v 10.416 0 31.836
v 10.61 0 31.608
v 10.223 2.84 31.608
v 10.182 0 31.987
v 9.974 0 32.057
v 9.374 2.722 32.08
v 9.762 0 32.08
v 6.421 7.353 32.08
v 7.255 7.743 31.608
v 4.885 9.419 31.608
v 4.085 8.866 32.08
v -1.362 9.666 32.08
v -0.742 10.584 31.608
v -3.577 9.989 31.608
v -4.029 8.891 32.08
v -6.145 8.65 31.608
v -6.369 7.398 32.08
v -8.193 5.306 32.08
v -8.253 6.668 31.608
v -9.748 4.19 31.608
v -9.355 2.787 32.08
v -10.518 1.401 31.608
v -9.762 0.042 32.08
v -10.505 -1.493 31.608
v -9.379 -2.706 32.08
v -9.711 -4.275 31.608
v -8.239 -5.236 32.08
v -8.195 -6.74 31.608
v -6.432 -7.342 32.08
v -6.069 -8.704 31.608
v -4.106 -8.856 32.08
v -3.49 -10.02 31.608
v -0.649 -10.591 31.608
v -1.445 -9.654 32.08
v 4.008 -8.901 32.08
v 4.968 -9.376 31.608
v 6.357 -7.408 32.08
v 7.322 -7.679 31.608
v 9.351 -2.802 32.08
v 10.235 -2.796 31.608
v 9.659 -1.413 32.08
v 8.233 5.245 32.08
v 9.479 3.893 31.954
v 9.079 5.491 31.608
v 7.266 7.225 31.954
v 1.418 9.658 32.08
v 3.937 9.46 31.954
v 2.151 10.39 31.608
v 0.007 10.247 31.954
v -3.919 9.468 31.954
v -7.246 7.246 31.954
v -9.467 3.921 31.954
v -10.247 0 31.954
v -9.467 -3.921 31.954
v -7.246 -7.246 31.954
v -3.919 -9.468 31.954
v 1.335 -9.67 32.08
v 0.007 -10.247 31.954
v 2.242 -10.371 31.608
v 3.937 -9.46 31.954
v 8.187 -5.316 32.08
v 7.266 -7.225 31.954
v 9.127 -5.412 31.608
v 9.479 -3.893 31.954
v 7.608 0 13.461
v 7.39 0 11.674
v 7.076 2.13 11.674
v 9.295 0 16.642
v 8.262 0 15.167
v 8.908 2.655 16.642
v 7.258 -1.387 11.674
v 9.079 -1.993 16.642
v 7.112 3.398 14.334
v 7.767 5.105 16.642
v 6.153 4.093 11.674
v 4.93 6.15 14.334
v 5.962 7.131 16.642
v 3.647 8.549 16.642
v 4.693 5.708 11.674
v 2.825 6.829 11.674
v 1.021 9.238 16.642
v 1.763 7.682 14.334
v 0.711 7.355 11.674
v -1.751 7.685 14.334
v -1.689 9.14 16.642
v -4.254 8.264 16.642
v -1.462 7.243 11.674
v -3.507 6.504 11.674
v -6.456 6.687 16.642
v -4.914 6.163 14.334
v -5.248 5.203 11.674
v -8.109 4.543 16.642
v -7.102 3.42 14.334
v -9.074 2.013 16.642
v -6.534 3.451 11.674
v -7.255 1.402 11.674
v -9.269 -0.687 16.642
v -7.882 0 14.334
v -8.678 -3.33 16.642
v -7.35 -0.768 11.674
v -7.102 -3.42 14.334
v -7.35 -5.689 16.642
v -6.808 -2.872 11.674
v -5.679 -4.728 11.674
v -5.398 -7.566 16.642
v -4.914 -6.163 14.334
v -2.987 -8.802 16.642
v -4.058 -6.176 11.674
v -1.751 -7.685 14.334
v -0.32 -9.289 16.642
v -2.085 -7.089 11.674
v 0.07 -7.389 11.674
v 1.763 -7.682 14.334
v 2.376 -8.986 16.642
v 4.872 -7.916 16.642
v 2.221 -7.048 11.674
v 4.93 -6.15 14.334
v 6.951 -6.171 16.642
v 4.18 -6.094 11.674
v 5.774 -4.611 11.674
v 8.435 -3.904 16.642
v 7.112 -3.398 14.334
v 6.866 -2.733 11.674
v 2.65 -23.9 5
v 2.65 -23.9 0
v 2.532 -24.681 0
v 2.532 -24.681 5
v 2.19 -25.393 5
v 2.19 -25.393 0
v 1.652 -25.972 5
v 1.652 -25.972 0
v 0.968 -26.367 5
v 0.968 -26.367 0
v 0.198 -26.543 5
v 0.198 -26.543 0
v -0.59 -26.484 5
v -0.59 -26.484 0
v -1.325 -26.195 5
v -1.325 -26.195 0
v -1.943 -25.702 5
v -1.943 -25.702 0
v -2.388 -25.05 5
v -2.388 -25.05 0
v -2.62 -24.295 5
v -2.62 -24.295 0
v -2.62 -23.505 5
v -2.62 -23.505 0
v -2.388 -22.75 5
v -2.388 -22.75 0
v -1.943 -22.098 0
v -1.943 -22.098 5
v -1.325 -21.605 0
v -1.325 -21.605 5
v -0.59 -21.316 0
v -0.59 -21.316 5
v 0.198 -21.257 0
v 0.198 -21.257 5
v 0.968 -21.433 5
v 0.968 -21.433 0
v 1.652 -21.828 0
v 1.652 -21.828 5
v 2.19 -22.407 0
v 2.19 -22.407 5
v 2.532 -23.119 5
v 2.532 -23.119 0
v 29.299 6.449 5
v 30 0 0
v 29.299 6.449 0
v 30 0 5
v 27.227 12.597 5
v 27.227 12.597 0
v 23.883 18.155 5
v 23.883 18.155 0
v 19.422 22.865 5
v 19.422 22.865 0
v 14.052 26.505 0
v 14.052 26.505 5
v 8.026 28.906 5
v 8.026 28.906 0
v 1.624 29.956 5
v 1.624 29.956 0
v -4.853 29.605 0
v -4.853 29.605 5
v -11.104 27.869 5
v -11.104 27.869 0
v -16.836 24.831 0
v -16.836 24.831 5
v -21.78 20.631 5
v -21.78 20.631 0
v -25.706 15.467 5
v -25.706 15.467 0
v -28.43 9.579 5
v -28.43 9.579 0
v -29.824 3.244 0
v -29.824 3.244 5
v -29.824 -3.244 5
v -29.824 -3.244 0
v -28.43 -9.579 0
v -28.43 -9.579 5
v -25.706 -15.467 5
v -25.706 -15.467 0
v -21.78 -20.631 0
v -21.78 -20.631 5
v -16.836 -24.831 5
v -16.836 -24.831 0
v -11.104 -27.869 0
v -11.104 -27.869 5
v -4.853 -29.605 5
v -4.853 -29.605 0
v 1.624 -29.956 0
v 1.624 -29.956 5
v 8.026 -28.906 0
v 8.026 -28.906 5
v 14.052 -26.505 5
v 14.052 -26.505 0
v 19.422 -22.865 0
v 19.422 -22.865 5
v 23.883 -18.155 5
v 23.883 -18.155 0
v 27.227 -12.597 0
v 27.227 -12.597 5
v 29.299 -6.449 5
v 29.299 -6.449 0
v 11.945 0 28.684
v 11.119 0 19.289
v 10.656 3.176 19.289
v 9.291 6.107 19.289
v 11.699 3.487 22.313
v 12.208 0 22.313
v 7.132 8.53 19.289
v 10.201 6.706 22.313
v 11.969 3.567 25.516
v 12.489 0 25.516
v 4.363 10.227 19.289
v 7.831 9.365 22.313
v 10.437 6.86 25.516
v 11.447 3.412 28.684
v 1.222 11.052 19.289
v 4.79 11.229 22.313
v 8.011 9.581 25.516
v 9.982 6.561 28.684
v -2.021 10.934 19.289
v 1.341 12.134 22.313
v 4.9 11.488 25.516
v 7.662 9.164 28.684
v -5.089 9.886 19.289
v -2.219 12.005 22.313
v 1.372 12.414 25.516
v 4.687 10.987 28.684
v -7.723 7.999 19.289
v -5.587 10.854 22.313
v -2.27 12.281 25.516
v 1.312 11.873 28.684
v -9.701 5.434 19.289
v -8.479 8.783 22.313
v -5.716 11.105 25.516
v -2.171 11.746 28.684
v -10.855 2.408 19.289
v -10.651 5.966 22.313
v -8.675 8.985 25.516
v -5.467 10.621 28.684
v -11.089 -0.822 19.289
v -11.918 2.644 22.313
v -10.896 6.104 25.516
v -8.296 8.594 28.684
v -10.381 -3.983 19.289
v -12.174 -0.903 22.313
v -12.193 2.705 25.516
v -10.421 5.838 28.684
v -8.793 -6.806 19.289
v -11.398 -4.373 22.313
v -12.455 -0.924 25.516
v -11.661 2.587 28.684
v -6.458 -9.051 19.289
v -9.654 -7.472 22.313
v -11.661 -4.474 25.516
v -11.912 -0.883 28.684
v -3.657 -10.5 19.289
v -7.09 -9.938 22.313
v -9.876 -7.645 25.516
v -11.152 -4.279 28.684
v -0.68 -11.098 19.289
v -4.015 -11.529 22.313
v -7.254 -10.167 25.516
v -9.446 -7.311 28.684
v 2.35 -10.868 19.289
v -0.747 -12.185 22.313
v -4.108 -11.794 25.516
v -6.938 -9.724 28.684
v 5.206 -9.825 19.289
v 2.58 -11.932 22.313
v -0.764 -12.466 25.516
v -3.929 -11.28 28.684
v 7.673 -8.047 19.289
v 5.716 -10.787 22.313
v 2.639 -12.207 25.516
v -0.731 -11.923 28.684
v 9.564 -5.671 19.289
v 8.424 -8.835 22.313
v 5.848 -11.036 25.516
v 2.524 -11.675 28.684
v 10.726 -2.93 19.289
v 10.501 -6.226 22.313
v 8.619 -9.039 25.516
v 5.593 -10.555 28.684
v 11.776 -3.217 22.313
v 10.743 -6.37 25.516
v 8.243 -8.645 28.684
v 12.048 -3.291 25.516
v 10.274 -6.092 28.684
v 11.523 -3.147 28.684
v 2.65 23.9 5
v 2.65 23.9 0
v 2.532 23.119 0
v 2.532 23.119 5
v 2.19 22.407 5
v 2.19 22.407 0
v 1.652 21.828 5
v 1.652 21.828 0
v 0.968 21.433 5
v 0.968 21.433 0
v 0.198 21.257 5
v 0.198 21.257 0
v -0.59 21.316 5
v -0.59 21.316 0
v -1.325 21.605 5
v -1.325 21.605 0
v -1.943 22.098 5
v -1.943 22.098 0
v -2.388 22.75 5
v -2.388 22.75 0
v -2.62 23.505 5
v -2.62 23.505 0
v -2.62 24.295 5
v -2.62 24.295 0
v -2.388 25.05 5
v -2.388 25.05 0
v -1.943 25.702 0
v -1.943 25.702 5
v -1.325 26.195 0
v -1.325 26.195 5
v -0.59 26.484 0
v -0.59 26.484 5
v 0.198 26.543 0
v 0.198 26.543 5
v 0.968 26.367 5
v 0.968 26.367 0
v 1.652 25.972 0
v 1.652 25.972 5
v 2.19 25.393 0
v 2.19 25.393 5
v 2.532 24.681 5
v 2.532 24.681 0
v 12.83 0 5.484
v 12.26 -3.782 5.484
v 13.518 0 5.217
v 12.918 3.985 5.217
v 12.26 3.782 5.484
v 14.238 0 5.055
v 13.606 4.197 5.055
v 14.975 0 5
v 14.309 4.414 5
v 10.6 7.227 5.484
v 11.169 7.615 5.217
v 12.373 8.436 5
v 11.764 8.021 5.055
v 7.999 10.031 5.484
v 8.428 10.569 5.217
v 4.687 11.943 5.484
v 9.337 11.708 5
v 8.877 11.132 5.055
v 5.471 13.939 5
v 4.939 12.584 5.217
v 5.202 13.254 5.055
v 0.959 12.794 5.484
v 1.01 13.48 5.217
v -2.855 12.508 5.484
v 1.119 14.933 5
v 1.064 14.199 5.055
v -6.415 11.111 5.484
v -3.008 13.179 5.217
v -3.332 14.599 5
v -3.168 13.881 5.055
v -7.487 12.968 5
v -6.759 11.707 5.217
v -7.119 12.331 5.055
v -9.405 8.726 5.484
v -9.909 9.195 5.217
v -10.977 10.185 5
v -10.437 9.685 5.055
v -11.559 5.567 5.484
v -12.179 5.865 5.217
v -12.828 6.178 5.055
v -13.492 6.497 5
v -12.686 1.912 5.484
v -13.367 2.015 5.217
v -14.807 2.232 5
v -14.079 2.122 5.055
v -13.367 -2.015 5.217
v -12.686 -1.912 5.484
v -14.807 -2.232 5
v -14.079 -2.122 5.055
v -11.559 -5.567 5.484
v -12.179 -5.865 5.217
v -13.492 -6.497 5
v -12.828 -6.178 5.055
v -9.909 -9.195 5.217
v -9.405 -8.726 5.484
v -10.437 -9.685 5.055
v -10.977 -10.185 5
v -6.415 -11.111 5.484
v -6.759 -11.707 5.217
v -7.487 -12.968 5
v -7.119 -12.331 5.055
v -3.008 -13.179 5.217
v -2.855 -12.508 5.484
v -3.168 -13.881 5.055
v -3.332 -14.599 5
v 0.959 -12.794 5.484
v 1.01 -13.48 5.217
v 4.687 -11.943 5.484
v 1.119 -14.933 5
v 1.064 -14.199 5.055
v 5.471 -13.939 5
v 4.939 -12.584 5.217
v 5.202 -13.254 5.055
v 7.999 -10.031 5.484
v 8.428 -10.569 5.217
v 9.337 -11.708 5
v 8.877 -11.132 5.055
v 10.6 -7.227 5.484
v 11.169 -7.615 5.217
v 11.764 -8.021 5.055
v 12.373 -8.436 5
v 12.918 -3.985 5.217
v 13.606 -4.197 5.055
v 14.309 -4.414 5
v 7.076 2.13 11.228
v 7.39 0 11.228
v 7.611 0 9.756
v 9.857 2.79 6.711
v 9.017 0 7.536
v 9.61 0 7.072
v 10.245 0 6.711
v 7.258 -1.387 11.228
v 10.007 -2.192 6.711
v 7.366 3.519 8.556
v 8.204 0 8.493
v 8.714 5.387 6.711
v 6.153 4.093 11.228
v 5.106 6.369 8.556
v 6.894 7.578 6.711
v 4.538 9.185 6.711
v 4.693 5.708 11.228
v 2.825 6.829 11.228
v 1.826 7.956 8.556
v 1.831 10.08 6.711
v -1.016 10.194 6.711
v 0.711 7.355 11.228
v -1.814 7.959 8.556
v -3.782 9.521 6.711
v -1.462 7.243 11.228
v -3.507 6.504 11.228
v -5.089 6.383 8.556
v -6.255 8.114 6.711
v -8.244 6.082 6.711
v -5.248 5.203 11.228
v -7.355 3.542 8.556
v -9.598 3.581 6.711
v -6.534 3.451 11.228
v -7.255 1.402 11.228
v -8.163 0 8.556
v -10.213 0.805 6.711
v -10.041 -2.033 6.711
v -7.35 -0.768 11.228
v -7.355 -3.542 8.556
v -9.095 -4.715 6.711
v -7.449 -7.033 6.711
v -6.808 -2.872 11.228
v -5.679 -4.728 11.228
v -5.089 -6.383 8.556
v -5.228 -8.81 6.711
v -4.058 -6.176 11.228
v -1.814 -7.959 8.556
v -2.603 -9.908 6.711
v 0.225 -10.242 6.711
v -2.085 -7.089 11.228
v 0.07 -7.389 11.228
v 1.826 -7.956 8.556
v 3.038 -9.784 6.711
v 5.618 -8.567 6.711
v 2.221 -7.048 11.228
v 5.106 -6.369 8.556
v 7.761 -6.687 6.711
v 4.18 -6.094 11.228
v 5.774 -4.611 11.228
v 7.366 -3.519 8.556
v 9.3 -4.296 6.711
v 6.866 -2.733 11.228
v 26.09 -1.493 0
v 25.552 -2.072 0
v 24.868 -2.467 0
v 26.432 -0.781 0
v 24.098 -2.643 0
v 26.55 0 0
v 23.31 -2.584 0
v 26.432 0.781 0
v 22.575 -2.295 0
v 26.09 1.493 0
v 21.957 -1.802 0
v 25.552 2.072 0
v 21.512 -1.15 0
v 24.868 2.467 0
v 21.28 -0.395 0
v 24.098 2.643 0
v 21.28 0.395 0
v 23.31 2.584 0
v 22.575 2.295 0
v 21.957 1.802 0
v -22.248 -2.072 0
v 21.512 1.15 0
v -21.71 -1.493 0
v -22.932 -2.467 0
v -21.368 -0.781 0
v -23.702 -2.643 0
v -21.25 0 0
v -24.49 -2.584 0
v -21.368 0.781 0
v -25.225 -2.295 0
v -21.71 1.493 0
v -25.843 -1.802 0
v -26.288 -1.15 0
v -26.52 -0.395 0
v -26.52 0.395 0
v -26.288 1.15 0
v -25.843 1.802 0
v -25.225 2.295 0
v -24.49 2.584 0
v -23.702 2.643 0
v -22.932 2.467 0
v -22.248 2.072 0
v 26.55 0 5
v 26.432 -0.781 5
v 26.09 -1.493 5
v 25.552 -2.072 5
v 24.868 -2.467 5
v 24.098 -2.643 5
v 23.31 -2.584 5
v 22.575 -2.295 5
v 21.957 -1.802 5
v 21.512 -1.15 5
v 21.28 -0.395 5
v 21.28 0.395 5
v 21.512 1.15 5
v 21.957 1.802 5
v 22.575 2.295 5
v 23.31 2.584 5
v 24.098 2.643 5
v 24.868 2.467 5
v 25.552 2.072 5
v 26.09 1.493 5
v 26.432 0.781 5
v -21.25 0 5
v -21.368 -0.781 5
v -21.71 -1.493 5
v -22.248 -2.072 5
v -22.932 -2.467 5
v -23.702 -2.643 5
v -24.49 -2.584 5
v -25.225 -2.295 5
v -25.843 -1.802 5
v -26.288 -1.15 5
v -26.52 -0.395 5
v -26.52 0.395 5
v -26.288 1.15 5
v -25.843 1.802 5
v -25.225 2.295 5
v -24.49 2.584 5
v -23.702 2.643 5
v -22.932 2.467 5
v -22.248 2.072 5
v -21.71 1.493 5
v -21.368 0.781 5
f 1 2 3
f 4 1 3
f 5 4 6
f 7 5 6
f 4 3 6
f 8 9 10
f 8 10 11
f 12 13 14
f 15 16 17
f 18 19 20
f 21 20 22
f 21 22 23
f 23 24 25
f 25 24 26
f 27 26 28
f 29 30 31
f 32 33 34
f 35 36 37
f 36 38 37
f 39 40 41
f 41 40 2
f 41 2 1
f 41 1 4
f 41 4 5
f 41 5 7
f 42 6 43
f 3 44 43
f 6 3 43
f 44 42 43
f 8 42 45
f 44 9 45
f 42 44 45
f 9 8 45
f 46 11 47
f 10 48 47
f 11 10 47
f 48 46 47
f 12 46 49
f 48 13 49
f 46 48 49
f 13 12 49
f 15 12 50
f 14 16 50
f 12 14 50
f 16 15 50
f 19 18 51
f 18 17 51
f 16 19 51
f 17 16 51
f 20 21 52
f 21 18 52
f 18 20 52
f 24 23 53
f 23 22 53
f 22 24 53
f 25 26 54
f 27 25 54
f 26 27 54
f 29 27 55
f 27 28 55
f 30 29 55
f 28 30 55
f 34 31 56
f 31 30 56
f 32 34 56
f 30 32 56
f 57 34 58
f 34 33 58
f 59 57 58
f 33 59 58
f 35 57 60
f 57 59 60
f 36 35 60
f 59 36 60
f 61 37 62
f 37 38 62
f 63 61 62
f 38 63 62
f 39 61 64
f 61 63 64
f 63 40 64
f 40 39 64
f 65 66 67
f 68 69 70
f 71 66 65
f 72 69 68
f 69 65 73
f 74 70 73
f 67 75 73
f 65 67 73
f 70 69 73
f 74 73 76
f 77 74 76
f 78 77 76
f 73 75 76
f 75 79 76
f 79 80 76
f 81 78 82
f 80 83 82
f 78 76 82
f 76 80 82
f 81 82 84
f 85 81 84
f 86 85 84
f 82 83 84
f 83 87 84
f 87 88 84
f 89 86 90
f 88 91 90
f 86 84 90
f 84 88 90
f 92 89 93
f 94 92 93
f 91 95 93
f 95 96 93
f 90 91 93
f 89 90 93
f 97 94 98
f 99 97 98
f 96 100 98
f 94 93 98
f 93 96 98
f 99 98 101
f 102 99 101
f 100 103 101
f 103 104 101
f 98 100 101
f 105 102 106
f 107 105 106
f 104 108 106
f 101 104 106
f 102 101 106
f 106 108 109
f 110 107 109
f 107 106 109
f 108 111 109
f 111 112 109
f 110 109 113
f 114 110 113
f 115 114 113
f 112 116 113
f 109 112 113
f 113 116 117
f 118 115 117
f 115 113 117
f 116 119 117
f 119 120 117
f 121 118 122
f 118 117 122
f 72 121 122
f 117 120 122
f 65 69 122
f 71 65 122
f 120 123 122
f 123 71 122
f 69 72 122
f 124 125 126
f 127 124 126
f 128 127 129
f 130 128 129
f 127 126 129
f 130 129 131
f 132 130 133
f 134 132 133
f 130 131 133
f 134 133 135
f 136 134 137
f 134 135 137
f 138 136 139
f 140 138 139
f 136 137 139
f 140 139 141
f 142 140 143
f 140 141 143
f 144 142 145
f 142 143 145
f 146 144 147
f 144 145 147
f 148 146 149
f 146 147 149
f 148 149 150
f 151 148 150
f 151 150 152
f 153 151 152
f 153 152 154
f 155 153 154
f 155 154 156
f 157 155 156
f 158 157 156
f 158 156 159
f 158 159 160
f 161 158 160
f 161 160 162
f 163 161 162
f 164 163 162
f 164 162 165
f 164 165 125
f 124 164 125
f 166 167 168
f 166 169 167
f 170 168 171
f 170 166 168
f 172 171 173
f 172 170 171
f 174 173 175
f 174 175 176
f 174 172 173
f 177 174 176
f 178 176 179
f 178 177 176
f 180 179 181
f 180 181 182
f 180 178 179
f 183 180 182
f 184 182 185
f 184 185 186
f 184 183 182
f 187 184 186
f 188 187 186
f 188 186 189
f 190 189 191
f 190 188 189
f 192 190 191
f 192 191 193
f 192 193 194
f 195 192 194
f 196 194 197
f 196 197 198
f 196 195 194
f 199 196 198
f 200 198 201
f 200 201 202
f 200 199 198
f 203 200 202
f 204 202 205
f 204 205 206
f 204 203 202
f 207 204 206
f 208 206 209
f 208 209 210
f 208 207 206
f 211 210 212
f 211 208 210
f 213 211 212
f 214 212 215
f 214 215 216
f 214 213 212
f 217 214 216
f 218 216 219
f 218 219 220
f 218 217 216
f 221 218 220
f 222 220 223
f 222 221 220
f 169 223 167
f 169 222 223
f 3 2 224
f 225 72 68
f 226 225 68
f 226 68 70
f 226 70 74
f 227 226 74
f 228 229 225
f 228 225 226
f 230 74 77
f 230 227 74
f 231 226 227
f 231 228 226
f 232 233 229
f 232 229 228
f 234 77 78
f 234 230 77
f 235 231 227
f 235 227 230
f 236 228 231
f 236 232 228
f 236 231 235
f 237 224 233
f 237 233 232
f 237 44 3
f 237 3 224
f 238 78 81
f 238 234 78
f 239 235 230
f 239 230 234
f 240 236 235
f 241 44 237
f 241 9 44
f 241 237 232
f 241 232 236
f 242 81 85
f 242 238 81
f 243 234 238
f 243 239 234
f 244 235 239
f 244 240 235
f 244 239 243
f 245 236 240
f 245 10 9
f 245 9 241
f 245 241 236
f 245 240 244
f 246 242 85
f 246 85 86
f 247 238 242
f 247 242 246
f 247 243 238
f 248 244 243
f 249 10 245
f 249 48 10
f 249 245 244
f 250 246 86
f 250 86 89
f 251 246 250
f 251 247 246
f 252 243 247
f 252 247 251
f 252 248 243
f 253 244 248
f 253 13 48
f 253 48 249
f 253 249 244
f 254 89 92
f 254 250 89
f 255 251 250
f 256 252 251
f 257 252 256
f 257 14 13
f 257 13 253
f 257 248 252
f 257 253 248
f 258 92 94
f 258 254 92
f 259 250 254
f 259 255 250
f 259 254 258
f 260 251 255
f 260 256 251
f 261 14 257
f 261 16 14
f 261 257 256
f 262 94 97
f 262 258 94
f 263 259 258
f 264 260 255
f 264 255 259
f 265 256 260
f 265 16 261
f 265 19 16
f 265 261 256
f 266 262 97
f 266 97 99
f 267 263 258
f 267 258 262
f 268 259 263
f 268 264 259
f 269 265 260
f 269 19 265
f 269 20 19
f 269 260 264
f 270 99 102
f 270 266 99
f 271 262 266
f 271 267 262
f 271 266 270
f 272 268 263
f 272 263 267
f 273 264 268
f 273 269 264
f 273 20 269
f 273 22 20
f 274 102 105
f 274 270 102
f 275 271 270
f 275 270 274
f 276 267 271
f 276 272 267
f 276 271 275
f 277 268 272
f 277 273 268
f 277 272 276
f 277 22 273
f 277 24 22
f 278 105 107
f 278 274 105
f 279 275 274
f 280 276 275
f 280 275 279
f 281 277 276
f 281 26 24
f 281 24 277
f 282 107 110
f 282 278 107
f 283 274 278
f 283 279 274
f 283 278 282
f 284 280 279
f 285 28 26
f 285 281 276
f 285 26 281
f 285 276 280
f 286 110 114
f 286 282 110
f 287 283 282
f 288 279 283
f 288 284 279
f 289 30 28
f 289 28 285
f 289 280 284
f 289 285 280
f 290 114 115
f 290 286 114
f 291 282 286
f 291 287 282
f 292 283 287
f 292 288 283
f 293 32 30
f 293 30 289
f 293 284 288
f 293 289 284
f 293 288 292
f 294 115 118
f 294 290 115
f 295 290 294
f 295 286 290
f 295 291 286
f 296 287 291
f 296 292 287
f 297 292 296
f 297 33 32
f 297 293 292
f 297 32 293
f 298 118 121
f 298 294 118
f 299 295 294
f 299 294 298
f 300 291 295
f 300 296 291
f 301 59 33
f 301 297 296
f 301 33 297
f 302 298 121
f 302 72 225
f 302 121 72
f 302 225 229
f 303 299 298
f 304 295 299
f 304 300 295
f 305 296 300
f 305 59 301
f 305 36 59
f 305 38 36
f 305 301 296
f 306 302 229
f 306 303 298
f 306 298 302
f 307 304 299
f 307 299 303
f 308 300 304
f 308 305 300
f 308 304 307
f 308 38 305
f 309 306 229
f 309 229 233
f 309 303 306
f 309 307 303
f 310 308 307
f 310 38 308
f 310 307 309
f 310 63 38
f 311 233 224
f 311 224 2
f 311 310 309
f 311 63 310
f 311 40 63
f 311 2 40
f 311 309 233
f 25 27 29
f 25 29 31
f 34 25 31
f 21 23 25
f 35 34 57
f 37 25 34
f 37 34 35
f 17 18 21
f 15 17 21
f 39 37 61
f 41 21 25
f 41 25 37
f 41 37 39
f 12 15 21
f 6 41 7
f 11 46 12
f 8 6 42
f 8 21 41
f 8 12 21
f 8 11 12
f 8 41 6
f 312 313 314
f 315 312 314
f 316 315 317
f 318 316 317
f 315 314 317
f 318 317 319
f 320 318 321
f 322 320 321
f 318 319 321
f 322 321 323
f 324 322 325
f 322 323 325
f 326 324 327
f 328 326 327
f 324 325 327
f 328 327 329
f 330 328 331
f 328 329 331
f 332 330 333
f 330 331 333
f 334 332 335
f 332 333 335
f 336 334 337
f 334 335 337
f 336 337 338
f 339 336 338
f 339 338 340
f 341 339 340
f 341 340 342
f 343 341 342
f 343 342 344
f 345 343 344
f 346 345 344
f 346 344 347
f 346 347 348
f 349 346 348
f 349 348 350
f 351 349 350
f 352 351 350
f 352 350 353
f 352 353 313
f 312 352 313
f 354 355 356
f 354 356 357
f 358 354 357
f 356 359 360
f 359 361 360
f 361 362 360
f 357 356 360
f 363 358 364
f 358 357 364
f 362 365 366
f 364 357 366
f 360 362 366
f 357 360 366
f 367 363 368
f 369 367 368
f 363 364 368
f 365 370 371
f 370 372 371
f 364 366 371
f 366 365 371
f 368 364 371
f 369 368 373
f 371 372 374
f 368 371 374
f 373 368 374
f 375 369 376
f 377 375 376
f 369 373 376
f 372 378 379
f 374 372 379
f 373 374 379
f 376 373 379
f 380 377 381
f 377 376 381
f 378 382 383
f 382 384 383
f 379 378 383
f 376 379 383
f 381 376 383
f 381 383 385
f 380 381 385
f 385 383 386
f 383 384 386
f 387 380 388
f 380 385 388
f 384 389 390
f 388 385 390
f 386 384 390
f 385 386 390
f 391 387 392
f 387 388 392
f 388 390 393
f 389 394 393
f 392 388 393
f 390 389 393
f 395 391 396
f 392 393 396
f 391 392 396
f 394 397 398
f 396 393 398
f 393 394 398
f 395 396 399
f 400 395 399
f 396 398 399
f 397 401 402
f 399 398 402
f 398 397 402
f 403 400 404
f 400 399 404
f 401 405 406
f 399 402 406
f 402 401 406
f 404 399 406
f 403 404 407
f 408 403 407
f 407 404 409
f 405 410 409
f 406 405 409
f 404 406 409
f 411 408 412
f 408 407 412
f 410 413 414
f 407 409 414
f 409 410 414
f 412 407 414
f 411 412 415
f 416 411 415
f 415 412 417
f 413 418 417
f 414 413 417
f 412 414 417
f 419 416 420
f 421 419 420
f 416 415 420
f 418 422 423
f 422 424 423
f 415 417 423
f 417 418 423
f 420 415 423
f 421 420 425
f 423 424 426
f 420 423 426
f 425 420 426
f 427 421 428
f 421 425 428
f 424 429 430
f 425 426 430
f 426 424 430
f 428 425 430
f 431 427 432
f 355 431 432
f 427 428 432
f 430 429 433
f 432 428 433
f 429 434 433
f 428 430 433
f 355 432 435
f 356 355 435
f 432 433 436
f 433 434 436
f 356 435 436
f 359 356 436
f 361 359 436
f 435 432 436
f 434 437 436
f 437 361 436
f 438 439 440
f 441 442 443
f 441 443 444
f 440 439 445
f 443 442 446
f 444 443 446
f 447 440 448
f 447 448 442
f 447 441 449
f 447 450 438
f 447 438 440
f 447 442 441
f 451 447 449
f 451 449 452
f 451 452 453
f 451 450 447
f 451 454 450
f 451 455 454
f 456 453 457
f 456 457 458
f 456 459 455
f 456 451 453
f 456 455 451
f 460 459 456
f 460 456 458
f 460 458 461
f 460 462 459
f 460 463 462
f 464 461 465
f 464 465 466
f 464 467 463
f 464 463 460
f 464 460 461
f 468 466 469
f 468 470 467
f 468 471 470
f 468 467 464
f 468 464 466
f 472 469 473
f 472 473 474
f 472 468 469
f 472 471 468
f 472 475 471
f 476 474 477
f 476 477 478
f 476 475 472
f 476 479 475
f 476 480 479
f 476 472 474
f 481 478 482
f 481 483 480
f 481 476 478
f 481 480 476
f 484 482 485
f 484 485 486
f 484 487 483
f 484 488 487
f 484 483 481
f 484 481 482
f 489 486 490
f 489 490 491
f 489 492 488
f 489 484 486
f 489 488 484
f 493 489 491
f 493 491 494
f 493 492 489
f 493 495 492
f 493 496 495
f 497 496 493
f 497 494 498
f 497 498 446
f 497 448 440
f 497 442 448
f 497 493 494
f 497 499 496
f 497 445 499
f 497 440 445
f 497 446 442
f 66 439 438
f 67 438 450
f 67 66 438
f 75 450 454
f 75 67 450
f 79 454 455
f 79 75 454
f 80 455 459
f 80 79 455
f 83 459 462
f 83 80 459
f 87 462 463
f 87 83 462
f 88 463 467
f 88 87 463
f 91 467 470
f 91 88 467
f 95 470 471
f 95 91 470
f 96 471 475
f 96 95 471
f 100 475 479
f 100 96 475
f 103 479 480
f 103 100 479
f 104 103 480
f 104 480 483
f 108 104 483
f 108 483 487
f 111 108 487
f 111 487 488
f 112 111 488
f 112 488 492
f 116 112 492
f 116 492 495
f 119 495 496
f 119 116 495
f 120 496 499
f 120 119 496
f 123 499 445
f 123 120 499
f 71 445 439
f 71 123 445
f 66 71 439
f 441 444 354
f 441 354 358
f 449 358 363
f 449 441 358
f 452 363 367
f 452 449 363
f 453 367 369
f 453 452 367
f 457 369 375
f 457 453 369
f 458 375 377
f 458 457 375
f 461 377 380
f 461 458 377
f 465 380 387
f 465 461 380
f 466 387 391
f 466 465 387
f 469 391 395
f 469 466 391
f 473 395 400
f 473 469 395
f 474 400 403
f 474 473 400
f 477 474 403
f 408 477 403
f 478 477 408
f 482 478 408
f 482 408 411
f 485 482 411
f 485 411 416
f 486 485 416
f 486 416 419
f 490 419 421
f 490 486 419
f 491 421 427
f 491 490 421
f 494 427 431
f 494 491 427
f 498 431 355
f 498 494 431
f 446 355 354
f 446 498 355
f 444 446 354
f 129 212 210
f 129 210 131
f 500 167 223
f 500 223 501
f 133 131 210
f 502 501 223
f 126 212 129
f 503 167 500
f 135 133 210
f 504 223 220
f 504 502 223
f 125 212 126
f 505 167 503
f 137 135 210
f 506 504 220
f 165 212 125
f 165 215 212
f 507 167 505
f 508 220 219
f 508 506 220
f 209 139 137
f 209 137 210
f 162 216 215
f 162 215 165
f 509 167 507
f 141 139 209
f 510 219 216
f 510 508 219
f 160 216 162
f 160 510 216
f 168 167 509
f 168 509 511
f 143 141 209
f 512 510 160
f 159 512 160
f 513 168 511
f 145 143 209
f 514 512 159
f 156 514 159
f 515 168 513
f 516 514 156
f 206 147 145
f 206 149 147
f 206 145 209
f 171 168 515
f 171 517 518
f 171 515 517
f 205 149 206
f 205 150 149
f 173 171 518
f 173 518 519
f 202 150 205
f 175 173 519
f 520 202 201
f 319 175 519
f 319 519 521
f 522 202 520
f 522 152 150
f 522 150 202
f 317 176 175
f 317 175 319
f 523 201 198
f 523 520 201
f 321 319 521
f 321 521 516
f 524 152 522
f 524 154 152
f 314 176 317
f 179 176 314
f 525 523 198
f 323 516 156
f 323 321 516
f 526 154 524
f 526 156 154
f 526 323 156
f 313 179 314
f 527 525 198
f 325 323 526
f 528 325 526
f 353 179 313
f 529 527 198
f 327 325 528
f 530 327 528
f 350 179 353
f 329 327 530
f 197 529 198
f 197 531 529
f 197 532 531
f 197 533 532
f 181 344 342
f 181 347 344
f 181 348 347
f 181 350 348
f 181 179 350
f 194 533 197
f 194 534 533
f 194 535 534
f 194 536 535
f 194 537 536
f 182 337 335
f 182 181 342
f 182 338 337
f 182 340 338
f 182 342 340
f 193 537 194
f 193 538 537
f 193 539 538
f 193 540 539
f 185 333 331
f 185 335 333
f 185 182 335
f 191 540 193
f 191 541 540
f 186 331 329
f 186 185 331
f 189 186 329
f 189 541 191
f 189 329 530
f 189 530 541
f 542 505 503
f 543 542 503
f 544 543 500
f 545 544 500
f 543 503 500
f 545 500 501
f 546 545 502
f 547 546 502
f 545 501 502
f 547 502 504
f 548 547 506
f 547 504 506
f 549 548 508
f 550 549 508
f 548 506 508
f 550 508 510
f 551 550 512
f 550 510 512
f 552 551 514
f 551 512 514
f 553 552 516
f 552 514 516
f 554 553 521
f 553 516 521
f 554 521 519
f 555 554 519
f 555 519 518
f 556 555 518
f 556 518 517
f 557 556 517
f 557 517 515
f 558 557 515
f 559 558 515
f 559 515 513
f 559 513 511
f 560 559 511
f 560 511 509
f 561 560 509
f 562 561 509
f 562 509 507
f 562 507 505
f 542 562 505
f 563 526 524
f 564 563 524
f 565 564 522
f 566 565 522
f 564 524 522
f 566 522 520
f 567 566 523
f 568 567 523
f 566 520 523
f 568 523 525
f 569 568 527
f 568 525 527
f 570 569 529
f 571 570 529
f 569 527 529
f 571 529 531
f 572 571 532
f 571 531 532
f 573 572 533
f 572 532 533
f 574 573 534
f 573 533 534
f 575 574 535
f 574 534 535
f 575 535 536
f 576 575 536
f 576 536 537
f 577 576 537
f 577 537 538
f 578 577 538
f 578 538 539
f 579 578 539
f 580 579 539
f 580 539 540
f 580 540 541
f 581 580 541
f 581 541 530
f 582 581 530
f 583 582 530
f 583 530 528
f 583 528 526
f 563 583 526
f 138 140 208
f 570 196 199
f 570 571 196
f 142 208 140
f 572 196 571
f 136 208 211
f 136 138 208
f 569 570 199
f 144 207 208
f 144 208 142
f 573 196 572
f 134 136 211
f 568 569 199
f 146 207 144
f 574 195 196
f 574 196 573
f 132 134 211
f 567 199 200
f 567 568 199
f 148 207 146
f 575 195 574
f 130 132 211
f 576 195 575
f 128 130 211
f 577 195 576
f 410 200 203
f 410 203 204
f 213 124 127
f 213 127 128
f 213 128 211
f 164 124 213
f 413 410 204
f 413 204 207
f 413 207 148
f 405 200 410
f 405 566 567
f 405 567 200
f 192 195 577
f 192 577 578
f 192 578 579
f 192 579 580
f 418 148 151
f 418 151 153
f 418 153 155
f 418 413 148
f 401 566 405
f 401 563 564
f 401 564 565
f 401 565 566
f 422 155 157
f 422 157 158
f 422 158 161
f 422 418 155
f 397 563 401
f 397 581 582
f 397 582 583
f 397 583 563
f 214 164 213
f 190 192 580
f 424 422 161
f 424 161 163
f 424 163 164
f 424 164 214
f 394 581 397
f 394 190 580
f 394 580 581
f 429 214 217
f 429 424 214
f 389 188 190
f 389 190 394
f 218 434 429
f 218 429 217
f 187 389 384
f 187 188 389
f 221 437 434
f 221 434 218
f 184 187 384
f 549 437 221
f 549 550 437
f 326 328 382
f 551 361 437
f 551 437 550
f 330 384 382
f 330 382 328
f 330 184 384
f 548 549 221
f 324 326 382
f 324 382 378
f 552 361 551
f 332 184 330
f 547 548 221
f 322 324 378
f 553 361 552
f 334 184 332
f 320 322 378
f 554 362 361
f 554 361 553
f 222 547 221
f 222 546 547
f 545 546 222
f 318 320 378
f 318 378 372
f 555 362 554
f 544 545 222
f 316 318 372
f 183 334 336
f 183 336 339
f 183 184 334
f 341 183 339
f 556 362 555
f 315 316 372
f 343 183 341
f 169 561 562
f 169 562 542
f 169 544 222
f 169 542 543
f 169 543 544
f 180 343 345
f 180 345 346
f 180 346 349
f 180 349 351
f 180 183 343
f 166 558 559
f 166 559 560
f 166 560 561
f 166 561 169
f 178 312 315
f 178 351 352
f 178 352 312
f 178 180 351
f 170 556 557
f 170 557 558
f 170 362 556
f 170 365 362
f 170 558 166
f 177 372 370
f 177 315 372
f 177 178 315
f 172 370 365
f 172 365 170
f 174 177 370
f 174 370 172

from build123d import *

# Parameters (mm, degrees)
F2_R     = 2.65
F3_DEPTH = 25
F4_R     = 7.429877
F5_R     = 5
F6_R     = 1


with BuildPart() as f1:
    # F0 (on Front) → F1 (revolve)
    with BuildSketch(Plane.XZ):
        with BuildLine():
            Line((0, 25), (0, 0))
            Line((0, 0), (30, 0))
            Line((30, 0), (30, 5))
            Line((30, 5), (13.847623, 5))
            Line((13.847623, 5), (7.389601, 8.067148))
            Line((7.389601, 8.067148), (7.389601, 14.918145))
            ThreePointArc((7.389601, 14.918145), (12.323801, 22.908607), (10.301951, 32.079535))
            Line((10.301951, 32.079535), (0, 32.079535))
            Line((0, 32.079535), (0, 25))
        make_face()
    revolve(axis=Axis((0, 0, 12.5), (0, 0, 1)))

    # F2 (on face) → F3 (cut)
    with BuildSketch(Plane(origin=(0, 0, 0), x_dir=(1, 0, 0), z_dir=(0, 0, -1))):
        with Locations((0, 23.9)):
            Circle(F2_R)
        with Locations((23.9, 0)):
            Circle(F2_R)
        with Locations((0, -23.9)):
            Circle(F2_R)
        with Locations((-23.9, 0)):
            Circle(F2_R)
    extrude(amount=-F3_DEPTH, mode=Mode.SUBTRACT)

    # F4
    f4_edges = [f1.edges().sort_by_distance(p)[0] for p in [
        (-7.389601, 0, 14.918145),
    ]]
    fillet(f4_edges, radius=F4_R)

    # F5
    f5_edges = [f1.edges().sort_by_distance(p)[0] for p in [
        (-7.389601, 0, 8.067148),
        (-13.847623, 0, 5),
    ]]
    fillet(f5_edges, radius=F5_R)

    # F6
    f6_edges = [f1.edges().sort_by_distance(p)[0] for p in [
        (-10.301951, 0, 32.079535),
    ]]
    fillet(f6_edges, radius=F6_R)


solid = f1.part
